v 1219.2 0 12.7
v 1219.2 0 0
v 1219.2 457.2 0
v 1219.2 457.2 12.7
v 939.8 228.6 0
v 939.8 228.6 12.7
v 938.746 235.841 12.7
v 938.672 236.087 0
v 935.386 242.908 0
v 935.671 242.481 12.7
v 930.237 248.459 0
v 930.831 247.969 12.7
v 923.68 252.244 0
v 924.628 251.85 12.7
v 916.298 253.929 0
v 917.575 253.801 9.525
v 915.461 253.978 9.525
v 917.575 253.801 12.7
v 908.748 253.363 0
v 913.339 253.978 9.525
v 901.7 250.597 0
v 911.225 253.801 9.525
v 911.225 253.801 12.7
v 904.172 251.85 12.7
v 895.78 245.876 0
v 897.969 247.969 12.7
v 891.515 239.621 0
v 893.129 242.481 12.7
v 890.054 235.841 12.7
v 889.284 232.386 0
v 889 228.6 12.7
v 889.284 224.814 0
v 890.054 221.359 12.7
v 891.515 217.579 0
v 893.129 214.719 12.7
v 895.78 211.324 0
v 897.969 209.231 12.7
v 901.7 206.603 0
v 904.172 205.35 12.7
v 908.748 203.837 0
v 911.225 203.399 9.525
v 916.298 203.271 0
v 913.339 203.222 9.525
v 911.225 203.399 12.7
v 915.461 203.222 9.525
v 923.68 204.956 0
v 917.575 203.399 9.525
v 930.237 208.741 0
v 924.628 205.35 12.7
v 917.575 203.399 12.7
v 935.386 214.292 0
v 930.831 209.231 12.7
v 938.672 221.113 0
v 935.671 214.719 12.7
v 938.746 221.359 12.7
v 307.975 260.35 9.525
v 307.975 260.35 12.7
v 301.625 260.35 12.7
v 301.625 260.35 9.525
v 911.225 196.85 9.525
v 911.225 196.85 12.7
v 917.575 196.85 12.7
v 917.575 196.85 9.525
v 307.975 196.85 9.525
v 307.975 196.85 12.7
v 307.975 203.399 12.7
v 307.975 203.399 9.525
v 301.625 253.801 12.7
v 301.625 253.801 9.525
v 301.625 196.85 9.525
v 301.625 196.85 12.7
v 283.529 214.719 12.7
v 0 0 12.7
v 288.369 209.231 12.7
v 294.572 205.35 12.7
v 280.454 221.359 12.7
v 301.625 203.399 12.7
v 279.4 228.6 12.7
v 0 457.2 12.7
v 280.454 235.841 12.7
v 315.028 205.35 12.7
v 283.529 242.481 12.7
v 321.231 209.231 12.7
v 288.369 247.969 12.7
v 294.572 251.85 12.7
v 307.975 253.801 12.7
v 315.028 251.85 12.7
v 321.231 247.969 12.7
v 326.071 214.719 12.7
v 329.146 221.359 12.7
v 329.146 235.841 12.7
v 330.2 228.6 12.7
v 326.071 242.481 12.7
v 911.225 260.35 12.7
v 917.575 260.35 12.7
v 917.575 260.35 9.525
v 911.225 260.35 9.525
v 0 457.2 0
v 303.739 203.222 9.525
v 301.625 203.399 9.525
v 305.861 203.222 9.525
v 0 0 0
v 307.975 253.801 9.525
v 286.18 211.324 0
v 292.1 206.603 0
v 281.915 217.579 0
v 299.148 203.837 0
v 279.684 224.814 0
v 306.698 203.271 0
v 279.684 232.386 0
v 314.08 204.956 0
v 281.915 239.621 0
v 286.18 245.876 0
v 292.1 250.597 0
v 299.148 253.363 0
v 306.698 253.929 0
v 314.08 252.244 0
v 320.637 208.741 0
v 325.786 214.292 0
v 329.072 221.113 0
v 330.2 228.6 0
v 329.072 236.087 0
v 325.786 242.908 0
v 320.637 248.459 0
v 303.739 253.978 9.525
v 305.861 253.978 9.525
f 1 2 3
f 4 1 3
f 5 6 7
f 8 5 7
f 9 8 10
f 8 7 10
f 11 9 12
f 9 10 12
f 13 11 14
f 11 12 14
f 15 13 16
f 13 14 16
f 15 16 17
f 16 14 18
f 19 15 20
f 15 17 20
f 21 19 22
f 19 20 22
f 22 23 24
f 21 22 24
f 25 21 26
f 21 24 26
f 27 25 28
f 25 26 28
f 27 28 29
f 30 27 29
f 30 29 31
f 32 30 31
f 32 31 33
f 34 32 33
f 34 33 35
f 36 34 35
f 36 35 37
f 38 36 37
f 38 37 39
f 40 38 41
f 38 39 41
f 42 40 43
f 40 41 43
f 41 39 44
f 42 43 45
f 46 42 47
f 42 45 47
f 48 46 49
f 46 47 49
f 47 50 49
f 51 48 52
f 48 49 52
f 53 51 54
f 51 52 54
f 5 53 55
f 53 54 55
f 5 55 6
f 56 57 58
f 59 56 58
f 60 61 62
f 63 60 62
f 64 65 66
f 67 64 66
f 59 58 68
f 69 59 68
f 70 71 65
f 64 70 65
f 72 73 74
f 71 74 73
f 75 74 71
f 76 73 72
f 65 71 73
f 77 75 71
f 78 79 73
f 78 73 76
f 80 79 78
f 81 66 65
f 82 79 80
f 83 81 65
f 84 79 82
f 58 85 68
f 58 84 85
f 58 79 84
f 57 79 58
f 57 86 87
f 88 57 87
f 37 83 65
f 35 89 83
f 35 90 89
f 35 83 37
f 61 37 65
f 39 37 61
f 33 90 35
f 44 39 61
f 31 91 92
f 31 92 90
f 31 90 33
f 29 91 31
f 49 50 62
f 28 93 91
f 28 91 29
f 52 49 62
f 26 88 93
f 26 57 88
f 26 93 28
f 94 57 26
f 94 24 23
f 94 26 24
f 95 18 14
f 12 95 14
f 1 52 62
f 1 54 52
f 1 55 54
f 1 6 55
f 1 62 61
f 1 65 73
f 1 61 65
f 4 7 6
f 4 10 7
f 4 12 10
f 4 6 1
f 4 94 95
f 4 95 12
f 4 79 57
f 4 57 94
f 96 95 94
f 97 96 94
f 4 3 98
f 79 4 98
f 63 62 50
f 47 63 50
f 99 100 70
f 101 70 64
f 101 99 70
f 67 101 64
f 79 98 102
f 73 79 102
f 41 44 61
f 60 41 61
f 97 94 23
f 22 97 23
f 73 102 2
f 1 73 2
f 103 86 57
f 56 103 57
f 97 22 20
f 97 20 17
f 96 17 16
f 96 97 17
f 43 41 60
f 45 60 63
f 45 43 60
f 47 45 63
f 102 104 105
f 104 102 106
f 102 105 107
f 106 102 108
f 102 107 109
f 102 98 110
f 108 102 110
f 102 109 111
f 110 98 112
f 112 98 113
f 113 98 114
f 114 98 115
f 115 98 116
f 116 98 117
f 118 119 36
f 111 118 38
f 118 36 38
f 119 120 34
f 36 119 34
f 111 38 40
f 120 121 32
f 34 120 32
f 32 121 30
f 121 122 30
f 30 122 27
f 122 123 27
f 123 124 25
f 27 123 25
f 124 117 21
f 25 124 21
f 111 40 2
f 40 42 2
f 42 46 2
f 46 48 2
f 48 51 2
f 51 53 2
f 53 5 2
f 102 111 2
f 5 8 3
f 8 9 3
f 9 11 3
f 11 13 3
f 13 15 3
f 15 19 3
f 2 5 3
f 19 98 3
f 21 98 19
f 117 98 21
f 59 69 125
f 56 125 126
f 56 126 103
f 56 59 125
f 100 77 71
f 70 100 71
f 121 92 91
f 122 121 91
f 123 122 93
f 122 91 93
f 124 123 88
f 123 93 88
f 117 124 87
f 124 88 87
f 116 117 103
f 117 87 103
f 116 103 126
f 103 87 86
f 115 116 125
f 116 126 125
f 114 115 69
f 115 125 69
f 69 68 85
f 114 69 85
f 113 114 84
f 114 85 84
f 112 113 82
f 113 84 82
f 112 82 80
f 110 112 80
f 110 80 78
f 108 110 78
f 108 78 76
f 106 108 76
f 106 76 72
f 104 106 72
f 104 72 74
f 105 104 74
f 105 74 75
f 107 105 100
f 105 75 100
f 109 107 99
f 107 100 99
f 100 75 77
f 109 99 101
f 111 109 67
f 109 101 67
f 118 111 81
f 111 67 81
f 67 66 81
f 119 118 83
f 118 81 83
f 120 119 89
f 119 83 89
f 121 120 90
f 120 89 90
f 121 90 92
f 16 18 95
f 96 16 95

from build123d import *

# Parameters (mm, degrees)
F1_DEPTH = 12.7
F2_R     = 25.4
F3_DEPTH = 12.7
F5_DEPTH = 3.175


with BuildPart() as f1:
    # F0 (on Top) → F1 (new body)
    with BuildSketch(Plane.XY):
        Polygon((0, 0), (88.9, 0), (1130.3, 0), (1219.2, 0), (1219.2, 19.05), (1219.2, 438.15), (1219.2, 457.2), (1130.3, 457.2), (88.9, 457.2), (0, 457.2), (0, 438.15), (0, 19.05), align=None)
    extrude(amount=F1_DEPTH)

    # F2 (on face) → F3 (cut, through all)
    with BuildSketch(Plane.XY.offset(12.7)):
        with Locations((914.4, 228.6)):
            Circle(F2_R)
        with Locations((304.8, 228.6)):
            Circle(F2_R)
    extrude(amount=-F3_DEPTH, mode=Mode.SUBTRACT)

    # F4 (on face) → F5 (cut)
    with BuildSketch(Plane.XY.offset(12.7)):
        with BuildLine():
            Line((301.625, 260.35), (301.625, 253.8007812379))
            ThreePointArc((301.625, 253.8007812379), (304.8, 254), (307.975, 253.8007812379))
            Line((307.975, 253.8007812379), (307.975, 260.35))
            Line((307.975, 260.35), (304.8, 260.35))
            Line((304.8, 260.35), (301.625, 260.35))
        make_face()
        with BuildLine():
            ThreePointArc((307.975, 203.3992187621), (304.8, 203.2), (301.625, 203.3992187621))
            Line((301.625, 203.3992187621), (301.625, 196.85))
            Line((301.625, 196.85), (304.8, 196.85))
            Line((304.8, 196.85), (307.975, 196.85))
            Line((307.975, 196.85), (307.975, 203.3992187621))
        make_face()
        with BuildLine():
            Line((917.575, 196.85), (917.575, 203.3992187621))
            ThreePointArc((917.575, 203.3992187621), (914.4, 203.2), (911.225, 203.3992187621))
            Line((911.225, 203.3992187621), (911.225, 196.85))
            Line((911.225, 196.85), (914.4, 196.85))
            Line((914.4, 196.85), (917.575, 196.85))
        make_face()
        with BuildLine():
            ThreePointArc((911.225, 253.8007812379), (914.4, 254), (917.575, 253.8007812379))
            Line((917.575, 253.8007812379), (917.575, 260.35))
            Line((917.575, 260.35), (914.4, 260.35))
            Line((914.4, 260.35), (911.225, 260.35))
            Line((911.225, 260.35), (911.225, 253.8007812379))
        make_face()
    extrude(amount=-F5_DEPTH, mode=Mode.SUBTRACT)


solid = f1.part
